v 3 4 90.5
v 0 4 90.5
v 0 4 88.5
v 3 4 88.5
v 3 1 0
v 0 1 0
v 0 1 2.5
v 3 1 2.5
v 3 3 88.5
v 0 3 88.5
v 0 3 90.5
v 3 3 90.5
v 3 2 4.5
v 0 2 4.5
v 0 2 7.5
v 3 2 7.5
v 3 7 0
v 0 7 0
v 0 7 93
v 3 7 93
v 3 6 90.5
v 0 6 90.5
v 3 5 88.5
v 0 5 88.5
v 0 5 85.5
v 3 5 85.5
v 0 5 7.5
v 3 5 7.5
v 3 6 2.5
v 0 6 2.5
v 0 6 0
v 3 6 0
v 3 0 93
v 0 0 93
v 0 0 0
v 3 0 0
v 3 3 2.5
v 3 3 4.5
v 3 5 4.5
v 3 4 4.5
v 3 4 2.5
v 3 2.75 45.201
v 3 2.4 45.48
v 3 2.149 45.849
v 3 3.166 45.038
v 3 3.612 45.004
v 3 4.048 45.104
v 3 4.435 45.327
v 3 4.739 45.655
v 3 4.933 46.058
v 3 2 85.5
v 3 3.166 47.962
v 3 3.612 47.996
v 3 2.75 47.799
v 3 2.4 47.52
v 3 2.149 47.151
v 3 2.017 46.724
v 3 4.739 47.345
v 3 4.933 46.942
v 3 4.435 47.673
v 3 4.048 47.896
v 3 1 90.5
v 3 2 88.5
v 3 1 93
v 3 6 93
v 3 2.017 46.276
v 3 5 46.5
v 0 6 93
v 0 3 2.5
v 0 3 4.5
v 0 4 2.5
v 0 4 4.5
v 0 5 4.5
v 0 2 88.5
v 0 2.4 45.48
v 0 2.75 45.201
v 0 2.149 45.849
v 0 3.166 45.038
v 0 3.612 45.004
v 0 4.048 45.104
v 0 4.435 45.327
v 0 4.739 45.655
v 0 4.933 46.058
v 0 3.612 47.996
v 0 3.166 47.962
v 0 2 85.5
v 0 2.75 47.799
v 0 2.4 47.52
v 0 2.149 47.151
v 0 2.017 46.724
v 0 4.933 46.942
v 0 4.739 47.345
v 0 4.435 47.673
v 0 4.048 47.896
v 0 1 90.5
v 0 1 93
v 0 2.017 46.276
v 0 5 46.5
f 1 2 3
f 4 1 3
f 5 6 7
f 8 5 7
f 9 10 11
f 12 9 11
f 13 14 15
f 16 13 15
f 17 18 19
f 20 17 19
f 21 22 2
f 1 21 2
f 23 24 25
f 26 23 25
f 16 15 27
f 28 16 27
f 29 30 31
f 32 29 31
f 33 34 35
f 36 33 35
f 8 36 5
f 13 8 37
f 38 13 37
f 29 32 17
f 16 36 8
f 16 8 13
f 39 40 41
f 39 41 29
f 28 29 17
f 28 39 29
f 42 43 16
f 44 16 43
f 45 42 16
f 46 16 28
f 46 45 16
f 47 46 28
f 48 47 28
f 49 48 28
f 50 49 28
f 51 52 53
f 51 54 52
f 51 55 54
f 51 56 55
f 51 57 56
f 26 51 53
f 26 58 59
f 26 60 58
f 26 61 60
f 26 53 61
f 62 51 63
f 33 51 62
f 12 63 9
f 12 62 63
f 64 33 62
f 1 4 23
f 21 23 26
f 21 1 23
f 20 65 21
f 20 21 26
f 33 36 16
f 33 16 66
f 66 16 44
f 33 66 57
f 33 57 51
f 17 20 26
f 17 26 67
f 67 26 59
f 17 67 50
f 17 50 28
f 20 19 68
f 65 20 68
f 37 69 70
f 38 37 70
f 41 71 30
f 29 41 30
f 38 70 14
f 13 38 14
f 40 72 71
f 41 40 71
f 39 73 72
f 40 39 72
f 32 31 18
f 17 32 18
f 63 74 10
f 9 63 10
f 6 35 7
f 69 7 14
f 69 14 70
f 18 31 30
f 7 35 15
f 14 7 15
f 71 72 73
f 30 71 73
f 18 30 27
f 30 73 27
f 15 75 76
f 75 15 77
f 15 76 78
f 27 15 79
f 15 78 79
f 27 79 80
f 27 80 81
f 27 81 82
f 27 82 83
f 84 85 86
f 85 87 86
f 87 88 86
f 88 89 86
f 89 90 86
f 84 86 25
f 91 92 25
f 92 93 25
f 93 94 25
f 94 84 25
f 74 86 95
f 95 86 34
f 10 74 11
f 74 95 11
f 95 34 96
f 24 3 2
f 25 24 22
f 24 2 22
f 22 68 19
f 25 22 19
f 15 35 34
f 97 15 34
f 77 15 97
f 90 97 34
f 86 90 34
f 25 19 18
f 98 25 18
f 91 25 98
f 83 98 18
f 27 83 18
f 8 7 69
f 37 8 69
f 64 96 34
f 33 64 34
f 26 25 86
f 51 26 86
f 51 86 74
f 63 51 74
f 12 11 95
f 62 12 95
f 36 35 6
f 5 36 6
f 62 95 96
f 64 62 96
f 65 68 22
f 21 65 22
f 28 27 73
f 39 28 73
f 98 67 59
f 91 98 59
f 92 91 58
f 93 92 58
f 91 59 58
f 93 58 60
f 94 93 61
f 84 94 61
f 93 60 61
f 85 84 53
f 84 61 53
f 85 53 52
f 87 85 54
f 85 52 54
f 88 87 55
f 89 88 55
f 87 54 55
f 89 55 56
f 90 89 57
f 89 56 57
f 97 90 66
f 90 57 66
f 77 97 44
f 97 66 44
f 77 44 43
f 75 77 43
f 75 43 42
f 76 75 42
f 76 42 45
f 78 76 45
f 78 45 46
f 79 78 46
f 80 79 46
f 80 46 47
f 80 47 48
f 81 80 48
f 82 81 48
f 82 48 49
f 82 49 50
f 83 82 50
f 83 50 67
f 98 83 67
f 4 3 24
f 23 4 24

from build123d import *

# Parameters (mm, degrees)
F1_DEPTH = 3
F2_R     = 1.5
F3_DEPTH = 3.001


with BuildPart() as f1:
    # F0 (on Right) → F1 (new body)
    with BuildSketch(Plane.YZ):
        Polygon((0, 93), (0, 0), (1, 0), (1, 2.5), (3, 2.5), (3, 4.5), (2, 4.5), (2, 7.5), (5, 7.5), (5, 4.5), (4, 4.5), (4, 2.5), (6, 2.5), (6, 0), (7, 0), (7, 93), (6, 93), (6, 90.5), (4, 90.5), (4, 88.5), (5, 88.5), (5, 85.5), (2, 85.5), (2, 88.5), (3, 88.5), (3, 90.5), (1, 90.5), (1, 93), align=None)
    extrude(amount=F1_DEPTH)

    # F2 (on face) → F3 (cut, through all)
    with BuildSketch(Plane.YZ.offset(3)):
        with Locations((3.5, 46.5)):
            Circle(F2_R)
    extrude(amount=-F3_DEPTH, mode=Mode.SUBTRACT)


solid = f1.part
